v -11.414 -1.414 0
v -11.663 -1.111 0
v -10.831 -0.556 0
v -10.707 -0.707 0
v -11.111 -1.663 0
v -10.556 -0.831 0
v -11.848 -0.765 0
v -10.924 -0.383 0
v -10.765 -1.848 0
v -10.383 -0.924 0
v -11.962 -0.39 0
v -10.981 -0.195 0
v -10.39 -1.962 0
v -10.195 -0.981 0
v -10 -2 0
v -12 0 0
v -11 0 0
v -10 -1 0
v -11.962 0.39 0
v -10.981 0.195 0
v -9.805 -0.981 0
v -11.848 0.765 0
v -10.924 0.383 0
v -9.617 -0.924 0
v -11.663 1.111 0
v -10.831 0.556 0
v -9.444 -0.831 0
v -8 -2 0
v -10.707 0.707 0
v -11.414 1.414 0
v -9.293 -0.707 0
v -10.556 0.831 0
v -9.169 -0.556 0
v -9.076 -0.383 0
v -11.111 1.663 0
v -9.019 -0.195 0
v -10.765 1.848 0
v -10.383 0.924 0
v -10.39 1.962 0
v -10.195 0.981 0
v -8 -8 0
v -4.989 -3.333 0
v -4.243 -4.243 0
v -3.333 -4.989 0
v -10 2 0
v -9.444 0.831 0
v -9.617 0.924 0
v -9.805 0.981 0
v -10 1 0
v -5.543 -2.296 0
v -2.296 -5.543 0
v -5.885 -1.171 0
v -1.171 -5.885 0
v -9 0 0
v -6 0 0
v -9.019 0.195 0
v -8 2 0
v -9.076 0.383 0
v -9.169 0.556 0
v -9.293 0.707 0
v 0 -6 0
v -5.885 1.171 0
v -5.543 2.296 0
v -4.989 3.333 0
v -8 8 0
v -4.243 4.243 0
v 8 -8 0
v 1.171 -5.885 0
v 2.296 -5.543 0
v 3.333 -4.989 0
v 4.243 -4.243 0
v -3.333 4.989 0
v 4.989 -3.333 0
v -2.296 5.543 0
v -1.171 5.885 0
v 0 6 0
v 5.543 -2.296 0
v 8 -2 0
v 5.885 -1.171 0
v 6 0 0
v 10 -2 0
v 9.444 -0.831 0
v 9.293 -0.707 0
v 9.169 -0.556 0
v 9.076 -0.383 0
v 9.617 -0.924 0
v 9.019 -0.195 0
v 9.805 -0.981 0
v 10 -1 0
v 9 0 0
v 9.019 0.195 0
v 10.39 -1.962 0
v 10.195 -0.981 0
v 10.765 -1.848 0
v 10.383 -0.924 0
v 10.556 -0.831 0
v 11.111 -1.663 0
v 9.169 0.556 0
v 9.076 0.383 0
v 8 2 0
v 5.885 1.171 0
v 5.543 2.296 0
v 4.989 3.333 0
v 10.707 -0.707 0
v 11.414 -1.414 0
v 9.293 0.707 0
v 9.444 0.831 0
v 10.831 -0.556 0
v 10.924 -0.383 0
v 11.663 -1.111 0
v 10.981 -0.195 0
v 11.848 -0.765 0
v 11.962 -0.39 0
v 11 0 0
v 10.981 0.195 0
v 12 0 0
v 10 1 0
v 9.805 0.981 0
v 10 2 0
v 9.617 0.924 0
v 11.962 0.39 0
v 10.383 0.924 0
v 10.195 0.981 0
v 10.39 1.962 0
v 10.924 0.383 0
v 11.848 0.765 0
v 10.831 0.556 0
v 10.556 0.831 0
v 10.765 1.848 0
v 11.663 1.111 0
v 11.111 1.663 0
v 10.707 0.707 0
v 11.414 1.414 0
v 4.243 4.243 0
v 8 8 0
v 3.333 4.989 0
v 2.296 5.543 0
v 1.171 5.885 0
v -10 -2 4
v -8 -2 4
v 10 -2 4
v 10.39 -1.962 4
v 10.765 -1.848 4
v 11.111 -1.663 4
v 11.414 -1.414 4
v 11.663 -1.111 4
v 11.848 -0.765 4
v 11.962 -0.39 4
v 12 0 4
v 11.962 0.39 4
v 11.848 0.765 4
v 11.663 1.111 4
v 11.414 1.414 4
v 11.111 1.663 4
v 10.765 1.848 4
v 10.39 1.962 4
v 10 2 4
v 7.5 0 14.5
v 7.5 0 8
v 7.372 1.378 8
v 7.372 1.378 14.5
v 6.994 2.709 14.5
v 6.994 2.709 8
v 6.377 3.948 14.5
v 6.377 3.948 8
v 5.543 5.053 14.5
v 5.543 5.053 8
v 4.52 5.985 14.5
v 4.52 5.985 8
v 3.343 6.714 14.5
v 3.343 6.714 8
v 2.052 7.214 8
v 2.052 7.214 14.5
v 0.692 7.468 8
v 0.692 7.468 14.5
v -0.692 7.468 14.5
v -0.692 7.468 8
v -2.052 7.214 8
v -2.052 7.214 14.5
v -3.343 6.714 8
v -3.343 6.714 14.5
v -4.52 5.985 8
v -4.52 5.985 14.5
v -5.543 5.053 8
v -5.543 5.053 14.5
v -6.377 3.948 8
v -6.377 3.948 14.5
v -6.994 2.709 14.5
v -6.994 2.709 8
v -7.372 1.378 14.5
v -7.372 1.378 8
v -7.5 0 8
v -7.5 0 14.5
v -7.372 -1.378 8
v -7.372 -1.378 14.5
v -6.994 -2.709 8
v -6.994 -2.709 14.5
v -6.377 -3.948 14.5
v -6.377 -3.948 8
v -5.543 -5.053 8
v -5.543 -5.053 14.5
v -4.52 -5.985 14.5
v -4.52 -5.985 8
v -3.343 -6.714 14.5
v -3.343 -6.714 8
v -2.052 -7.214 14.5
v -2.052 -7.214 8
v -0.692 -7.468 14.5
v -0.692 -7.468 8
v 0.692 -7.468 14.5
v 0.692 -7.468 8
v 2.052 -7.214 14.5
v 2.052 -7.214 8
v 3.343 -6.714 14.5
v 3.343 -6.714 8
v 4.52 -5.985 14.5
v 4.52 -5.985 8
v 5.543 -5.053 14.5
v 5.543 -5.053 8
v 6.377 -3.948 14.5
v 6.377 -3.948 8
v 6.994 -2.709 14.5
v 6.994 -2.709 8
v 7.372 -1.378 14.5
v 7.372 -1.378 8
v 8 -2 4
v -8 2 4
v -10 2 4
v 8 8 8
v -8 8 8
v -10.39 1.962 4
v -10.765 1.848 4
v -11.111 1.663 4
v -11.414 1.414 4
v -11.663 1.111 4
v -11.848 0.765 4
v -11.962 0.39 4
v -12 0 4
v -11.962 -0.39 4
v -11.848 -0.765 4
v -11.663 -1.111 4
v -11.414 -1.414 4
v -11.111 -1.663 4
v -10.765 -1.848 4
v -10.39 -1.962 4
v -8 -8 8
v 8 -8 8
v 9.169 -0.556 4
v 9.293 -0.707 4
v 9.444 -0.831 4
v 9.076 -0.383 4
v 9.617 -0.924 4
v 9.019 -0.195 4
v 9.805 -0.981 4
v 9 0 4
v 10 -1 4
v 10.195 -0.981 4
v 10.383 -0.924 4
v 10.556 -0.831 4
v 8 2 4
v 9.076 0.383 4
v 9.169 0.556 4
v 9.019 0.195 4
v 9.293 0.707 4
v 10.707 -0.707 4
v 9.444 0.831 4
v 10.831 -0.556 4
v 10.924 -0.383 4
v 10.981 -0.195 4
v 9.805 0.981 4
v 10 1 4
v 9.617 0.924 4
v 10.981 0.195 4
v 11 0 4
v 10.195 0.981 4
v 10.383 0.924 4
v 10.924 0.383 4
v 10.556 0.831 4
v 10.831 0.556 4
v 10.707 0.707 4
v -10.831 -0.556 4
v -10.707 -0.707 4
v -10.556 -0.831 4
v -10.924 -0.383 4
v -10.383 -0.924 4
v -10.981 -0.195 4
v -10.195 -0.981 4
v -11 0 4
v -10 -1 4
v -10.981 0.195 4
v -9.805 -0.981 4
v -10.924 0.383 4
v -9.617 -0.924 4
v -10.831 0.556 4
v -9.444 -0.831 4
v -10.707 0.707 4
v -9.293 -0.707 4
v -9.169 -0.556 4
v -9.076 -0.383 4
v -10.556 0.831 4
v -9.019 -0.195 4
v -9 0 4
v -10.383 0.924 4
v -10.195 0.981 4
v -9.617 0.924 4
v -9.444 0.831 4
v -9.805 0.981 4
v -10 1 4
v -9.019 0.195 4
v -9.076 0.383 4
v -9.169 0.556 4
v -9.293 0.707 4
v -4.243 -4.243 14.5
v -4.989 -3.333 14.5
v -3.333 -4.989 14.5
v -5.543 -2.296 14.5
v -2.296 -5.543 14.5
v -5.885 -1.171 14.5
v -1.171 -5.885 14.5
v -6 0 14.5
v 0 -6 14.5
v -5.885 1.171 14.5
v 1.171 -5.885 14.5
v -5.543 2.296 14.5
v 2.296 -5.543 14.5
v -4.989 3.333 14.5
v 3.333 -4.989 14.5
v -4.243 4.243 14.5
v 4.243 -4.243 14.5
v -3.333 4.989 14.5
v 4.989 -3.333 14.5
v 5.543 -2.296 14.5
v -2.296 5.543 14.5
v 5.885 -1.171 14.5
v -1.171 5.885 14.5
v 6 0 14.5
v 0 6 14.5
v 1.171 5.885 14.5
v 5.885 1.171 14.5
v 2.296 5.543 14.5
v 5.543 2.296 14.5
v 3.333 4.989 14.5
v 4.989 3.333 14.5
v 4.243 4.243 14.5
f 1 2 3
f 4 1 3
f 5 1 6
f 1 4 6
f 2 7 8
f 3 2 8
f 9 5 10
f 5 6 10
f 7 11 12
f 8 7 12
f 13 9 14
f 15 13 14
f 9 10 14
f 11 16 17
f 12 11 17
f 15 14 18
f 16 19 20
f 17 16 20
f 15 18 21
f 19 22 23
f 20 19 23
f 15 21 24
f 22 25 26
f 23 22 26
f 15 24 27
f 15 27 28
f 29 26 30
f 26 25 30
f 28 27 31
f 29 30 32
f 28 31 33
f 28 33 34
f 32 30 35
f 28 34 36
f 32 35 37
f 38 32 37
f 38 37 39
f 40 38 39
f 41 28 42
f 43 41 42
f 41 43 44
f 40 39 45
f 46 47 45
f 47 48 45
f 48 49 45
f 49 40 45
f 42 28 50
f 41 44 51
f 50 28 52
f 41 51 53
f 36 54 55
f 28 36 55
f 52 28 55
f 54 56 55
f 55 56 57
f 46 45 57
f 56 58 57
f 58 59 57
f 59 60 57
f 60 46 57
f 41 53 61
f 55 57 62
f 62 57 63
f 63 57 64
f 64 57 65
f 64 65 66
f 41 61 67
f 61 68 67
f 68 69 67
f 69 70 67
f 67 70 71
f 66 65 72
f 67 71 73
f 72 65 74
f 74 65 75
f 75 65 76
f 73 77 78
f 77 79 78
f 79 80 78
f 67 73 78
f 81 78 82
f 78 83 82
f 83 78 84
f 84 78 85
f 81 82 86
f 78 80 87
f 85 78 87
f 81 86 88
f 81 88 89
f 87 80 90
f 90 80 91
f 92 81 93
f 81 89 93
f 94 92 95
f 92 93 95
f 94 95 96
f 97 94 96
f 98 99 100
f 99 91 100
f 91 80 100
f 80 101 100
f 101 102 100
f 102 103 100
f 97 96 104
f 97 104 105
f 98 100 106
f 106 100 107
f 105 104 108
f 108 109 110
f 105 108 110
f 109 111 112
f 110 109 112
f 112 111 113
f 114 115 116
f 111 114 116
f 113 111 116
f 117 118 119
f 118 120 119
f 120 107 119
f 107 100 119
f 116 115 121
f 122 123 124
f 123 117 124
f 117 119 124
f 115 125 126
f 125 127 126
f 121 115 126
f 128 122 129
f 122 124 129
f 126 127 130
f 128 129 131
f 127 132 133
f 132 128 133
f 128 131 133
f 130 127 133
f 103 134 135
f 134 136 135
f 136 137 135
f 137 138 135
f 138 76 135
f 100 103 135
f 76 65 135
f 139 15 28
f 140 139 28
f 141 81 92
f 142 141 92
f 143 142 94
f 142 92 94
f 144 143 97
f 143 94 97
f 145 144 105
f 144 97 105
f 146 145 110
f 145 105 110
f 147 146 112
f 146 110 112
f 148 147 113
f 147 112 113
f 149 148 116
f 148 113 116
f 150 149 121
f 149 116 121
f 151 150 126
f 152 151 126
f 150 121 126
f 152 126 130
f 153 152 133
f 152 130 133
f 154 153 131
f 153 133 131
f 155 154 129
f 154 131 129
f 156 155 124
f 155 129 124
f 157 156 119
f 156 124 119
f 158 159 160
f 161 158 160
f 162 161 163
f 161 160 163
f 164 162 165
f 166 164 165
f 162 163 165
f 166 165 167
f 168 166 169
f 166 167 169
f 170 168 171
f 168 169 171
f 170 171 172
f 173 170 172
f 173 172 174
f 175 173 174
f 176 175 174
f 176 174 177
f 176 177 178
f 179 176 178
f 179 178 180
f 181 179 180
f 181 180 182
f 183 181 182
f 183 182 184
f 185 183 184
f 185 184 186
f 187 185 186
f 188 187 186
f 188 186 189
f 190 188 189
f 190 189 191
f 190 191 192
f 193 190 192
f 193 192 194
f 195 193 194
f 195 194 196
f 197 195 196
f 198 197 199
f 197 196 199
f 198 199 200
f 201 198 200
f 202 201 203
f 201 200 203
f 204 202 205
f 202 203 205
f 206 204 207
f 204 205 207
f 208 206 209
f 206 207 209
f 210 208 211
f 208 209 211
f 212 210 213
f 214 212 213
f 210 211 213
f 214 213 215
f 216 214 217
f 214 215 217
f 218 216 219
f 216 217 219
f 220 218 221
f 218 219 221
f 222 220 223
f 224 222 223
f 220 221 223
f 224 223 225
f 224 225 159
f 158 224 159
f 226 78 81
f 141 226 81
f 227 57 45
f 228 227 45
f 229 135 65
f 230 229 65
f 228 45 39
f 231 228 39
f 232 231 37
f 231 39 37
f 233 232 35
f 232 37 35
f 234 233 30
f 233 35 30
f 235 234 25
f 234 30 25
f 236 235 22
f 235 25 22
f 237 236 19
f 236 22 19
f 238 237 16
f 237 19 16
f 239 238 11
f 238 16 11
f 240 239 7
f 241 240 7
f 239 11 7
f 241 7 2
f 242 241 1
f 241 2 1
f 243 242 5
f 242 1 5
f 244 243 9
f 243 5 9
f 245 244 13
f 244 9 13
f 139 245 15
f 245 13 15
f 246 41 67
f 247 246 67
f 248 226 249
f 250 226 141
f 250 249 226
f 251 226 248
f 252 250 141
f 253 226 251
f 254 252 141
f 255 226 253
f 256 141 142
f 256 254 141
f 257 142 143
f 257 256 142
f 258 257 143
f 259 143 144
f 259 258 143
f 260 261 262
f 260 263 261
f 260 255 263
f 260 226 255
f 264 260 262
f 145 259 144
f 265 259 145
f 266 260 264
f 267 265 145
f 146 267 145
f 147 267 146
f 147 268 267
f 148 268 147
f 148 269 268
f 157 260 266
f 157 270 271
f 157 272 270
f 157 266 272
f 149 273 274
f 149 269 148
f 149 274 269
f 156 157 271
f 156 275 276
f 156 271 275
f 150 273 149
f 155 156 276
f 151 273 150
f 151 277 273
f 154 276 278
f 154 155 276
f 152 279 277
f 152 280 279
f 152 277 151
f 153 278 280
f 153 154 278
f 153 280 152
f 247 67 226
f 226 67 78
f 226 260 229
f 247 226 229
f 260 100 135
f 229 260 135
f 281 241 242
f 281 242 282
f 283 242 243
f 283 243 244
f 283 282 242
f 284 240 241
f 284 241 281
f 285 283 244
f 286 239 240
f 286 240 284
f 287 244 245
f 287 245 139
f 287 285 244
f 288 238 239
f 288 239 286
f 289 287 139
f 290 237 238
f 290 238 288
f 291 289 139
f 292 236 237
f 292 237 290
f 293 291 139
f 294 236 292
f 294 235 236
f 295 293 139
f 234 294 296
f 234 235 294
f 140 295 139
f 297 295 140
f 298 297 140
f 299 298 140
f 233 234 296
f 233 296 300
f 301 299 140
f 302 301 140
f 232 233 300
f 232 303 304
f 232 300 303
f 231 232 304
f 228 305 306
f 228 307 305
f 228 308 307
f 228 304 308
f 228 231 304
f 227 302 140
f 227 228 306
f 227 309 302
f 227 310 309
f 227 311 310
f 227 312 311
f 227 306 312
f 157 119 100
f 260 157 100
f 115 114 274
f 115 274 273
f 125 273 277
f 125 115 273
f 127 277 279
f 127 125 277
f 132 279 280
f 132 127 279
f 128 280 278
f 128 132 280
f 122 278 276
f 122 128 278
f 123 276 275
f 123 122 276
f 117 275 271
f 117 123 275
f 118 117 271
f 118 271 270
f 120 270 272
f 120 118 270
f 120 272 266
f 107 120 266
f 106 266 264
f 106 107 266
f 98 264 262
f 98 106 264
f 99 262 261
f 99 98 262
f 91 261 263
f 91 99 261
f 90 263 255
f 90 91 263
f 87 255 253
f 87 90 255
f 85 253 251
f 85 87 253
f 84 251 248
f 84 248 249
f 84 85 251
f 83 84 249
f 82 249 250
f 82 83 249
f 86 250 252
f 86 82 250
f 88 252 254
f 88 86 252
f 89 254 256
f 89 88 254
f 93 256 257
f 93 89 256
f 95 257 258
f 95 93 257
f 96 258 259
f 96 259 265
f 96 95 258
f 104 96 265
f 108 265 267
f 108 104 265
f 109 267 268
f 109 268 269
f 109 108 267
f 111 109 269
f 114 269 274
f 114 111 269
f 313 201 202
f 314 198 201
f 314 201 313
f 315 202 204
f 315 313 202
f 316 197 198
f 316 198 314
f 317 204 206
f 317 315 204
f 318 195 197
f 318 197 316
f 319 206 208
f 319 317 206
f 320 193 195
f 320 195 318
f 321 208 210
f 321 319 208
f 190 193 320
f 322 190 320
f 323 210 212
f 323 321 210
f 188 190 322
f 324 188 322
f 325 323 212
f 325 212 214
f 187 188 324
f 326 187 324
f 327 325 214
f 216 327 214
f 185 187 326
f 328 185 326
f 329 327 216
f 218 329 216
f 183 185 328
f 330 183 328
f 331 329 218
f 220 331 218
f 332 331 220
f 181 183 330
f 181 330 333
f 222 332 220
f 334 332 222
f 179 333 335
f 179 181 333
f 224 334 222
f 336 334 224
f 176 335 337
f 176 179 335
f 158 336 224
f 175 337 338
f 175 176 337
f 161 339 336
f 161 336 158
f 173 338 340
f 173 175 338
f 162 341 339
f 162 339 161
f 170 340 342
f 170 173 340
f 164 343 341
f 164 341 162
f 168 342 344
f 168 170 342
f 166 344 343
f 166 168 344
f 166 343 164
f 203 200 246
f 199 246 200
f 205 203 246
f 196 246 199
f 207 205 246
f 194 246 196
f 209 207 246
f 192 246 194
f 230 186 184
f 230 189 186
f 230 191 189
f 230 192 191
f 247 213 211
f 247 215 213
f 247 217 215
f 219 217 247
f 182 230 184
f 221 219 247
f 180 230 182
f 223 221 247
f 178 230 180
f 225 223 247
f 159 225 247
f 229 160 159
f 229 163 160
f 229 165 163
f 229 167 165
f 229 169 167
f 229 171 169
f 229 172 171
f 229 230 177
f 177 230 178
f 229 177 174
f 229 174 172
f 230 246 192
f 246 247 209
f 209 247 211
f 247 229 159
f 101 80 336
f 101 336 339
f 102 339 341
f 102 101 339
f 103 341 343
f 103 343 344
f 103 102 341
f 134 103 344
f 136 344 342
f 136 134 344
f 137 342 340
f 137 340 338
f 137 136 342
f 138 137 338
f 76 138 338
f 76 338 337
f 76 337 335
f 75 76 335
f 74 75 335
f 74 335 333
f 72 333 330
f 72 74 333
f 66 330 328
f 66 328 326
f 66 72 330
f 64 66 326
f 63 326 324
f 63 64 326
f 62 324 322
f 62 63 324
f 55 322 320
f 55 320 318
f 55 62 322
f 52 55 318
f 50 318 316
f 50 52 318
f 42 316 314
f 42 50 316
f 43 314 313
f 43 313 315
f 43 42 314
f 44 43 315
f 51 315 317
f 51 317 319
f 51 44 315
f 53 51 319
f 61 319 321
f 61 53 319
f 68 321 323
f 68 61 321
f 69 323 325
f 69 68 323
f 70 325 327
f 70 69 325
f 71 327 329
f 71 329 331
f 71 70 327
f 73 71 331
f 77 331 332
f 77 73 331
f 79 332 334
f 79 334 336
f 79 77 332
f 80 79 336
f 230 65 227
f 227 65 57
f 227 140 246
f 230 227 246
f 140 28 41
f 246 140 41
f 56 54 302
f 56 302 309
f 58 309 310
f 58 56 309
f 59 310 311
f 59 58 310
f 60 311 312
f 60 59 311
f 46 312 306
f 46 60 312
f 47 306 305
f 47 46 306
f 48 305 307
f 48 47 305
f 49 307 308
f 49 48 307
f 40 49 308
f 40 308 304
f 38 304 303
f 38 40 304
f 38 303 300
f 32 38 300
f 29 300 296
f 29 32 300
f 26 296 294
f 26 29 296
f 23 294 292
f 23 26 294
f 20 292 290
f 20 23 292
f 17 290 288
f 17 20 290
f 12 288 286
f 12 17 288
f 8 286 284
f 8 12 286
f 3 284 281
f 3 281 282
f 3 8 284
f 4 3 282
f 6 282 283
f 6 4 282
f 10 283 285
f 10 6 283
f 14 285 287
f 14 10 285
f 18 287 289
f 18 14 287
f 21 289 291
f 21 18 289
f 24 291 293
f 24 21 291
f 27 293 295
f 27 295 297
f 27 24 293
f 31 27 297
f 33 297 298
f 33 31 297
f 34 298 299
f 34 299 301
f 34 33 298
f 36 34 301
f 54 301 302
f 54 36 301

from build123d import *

# Parameters (mm, degrees)
F0_R     = 7.5
F0_R_2   = 6
F1_DEPTH = 14.5
F2_DEPTH = 8
F0_R_3   = 1
F3_DEPTH = 4


with BuildPart() as f1:
    # F0 (on Top) → F1 (new body)
    with BuildSketch(Plane.XY):
        Circle(F0_R)
        Circle(F0_R_2, mode=Mode.SUBTRACT)
    extrude(amount=F1_DEPTH)

    # F0 (on Top) → F2 (join)
    with BuildSketch(Plane.XY):
        Polygon((8, 2), (8, 8), (-8, 8), (-8, 2), (-8, -2), (-8, -8), (8, -8), (8, -2), align=None)
        Circle(F0_R, mode=Mode.SUBTRACT)
    extrude(amount=F2_DEPTH)

    # F0 (on Top) → F3 (join)
    with BuildSketch(Plane.XY):
        with BuildLine():
            Line((-8, -2), (-8, 2))
            Line((-8, 2), (-10, 2))
            ThreePointArc((-10, 2), (-12, 0), (-10, -2))
            Line((-10, -2), (-8, -2))
        make_face()
        with Locations((-10, 0)):
            Circle(F0_R_3, mode=Mode.SUBTRACT)
        with BuildLine():
            Line((10, 2), (8, 2))
            Line((8, 2), (8, -2))
            Line((8, -2), (10, -2))
            ThreePointArc((10, -2), (12, 0), (10, 2))
        make_face()
        with Locations((10, 0)):
            Circle(F0_R_3, mode=Mode.SUBTRACT)
    extrude(amount=F3_DEPTH)


solid = f1.part
